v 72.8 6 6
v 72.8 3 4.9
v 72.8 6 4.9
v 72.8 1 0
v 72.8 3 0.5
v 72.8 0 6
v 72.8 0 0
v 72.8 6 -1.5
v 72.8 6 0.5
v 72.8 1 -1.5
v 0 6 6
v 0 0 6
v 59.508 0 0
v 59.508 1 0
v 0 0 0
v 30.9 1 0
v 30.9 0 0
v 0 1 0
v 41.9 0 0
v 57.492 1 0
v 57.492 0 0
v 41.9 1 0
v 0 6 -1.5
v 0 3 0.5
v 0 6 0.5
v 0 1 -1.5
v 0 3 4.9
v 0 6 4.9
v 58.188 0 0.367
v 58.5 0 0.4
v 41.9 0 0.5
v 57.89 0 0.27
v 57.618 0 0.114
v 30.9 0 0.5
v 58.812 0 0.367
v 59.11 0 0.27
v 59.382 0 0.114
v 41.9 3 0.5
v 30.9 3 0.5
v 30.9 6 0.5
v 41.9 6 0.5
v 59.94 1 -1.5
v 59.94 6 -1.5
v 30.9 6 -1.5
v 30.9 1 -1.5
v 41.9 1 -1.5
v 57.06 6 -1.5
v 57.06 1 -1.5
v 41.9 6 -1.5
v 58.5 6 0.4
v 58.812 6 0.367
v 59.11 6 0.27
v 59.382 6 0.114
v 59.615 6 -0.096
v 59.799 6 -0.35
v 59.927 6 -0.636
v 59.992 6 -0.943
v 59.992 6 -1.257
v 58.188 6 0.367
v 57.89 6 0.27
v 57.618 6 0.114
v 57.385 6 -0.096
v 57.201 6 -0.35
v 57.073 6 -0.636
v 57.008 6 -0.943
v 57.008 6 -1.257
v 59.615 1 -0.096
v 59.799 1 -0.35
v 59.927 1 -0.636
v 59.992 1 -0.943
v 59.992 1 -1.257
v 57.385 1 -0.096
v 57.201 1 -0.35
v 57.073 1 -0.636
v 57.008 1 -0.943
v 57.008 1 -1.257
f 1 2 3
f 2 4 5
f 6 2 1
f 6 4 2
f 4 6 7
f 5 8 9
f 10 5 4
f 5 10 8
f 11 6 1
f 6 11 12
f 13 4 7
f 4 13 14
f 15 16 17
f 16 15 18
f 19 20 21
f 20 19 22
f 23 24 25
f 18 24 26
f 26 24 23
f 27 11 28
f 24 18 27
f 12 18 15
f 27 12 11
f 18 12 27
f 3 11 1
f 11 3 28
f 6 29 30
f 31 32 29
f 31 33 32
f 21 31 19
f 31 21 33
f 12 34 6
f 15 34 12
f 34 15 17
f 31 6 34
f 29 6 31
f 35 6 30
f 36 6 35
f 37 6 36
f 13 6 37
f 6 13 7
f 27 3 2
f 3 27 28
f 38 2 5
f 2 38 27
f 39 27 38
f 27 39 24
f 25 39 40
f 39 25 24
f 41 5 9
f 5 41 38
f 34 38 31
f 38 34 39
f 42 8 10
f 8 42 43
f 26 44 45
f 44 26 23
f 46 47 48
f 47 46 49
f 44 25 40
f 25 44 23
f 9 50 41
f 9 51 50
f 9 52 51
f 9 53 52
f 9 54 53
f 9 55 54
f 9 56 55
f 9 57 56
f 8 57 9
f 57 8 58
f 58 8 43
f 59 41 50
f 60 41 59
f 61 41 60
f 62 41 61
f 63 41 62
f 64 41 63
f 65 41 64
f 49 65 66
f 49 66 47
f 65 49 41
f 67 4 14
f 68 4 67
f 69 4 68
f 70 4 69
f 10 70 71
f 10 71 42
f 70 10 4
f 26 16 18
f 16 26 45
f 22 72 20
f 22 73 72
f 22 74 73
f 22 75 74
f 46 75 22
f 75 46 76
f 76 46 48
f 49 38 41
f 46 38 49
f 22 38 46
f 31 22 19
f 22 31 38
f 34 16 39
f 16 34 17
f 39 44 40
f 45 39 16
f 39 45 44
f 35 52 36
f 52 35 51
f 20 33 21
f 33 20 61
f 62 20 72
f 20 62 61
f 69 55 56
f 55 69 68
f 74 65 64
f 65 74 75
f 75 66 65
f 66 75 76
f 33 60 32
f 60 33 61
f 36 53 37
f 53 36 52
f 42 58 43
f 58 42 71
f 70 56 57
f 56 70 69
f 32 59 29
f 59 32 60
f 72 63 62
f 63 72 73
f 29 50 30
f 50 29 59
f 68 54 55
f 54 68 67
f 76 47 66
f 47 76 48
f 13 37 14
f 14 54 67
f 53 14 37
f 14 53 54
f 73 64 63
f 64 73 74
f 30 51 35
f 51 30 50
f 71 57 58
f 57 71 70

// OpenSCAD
WSCR = 73 - .2; // Width of the display's visible part.
MDISP = 3; // Width of the display's margin.
H = 6; // Height of the panel.
TFINGER = 3; // Depth of the groove that locks the panel in place.
WFINGER = 10;
WALL = 1; // Thickness of the walls.

module corner_top() {
  color("white")
    difference() {
      union() {
        difference() {
          cube([WSCR, H, H]);
          translate([-.1, H - MDISP, -.1])
            cube([WSCR + .2, 10, H - WALL]);
        }
        translate([0, 1, -1.5])
          cube([WSCR, 5, 2]);
      }
      translate([(WSCR - 11) / 2, -.01, -4])
        cube([11, 10, 4.5]);
      translate([(WSCR - 20) / 2 + 32.1, 10, -1.1])
        rotate([90, 90, 0])
          cylinder(h=20, r=3 / 2, $fs=.1);
    }
}

corner_top();
